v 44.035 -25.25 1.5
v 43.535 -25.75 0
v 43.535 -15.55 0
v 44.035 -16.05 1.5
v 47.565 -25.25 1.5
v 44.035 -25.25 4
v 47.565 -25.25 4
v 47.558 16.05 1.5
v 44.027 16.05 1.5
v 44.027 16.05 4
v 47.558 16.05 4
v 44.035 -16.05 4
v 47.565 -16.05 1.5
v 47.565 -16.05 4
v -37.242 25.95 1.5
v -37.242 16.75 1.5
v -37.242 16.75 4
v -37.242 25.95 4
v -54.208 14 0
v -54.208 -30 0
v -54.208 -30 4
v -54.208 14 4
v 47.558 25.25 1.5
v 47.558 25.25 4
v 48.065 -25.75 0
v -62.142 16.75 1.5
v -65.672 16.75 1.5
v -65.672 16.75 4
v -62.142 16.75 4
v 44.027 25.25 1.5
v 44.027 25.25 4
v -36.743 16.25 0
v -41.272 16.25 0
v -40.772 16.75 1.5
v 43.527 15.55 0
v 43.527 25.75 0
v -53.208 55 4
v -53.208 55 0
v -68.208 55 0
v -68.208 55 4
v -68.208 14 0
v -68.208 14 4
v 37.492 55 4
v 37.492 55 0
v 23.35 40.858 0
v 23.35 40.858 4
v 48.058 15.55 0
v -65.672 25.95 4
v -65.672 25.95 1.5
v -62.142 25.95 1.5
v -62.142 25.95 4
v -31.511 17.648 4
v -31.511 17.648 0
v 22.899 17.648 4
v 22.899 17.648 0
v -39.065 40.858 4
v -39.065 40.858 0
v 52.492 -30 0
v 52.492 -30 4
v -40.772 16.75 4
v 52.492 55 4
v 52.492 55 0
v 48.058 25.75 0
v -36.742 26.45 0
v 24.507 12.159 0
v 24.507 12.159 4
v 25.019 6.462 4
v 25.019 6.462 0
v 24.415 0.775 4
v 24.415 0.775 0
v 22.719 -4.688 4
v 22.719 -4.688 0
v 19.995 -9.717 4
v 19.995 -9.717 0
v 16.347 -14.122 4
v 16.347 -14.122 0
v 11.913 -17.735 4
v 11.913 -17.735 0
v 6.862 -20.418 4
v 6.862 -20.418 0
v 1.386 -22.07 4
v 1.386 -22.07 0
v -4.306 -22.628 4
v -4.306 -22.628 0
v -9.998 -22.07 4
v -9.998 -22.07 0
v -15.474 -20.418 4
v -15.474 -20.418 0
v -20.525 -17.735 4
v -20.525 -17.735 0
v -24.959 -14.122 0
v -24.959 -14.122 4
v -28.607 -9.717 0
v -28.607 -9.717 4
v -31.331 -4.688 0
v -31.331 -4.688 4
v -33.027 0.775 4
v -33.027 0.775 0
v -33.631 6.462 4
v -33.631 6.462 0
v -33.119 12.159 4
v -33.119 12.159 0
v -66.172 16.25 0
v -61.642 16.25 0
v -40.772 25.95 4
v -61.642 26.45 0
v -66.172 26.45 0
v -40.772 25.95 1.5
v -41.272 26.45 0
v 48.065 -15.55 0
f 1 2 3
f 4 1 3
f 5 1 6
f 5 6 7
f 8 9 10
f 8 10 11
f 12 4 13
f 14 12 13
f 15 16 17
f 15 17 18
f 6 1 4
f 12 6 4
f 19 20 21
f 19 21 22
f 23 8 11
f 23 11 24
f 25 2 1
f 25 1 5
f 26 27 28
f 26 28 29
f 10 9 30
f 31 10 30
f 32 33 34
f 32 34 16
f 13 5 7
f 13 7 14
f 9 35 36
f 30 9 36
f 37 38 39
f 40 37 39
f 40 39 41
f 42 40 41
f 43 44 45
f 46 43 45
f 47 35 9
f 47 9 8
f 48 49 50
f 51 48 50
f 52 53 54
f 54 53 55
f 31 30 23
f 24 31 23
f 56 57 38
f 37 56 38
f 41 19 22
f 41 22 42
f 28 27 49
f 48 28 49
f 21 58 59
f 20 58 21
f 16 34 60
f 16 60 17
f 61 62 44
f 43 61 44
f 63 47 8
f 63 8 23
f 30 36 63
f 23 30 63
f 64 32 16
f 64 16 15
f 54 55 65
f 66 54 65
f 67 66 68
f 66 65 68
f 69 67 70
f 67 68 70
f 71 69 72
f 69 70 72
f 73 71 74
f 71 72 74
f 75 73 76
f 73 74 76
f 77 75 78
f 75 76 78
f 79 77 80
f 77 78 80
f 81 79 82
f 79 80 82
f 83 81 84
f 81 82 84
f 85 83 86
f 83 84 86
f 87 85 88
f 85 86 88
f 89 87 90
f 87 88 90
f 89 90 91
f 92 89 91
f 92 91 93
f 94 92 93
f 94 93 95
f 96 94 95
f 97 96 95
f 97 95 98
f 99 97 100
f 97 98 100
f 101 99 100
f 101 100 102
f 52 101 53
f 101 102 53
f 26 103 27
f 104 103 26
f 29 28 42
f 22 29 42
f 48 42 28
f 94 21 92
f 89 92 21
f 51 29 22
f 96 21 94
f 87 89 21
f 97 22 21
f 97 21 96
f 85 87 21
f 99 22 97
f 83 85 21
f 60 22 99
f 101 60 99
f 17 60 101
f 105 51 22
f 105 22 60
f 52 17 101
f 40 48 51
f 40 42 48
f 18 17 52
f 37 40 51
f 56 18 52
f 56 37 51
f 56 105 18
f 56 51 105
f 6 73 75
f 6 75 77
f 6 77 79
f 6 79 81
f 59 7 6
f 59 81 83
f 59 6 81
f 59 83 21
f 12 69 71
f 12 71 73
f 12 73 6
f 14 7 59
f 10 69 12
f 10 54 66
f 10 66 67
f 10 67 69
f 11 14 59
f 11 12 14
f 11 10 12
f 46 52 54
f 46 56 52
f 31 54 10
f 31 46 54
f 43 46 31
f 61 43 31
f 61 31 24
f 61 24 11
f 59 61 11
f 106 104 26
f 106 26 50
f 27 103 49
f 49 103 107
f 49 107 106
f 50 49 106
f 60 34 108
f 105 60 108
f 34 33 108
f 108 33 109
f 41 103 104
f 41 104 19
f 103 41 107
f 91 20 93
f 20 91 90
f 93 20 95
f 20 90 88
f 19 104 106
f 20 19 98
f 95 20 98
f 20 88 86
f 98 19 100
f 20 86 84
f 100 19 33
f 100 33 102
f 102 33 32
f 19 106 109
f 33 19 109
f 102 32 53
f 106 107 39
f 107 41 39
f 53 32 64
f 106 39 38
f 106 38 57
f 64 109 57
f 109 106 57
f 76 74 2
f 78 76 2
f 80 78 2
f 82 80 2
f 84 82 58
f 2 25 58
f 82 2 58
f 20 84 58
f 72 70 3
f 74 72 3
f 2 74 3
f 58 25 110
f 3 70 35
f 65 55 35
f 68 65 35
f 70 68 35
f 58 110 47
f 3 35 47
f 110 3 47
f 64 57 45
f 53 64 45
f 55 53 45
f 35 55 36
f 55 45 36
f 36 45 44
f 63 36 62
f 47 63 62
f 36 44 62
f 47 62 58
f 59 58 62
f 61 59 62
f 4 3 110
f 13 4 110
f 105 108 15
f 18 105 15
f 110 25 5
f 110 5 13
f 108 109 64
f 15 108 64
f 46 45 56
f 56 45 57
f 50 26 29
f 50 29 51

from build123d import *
from OCP.BRepFilletAPI import BRepFilletAPI_MakeChamfer

# Parameters (mm, degrees)
SKETCH1_W           = 3.53
SKETCH1_H           = 9.2
BOSS_EXTRUDE1_DEPTH = 4
BOSS_EXTRUDE2_DEPTH = 4
CHAMFER1_SIZE       = 1.5
CHAMFER1_SIZE2      = 0.5


with BuildPart() as part:
    # Sketch1 → Boss-Extrude1 (new body)
    with BuildSketch(Plane.XY):
        Polygon((52.4925, 30), (52.4925, -30), (-54.2075, -30), (-54.2075, 14), (-68.2075, 14), (-68.2075, 30), align=None)
        with BuildLine():
            Line((-31.510630119, 17.647843267), (22.89855475, 17.647843267))
            ThreePointArc((22.89855475, 17.647843267), (-4.306037684, -22.627990687), (-31.510630119, 17.647843267))
        make_face(mode=Mode.SUBTRACT)
        with Locations((-39.0075, 21.35)):
            Rectangle(SKETCH1_W, SKETCH1_H, mode=Mode.SUBTRACT)
        with Locations((45.7925, 20.65)):
            Rectangle(SKETCH1_W, SKETCH1_H, mode=Mode.SUBTRACT)
        with Locations((45.8, -20.65)):
            Rectangle(SKETCH1_W, SKETCH1_H, mode=Mode.SUBTRACT)
        with Locations((-63.9075, 21.35)):
            Rectangle(SKETCH1_W, SKETCH1_H, mode=Mode.SUBTRACT)
    extrude(amount=BOSS_EXTRUDE1_DEPTH)

    # Sketch2 → Boss-Extrude2 (add)
    with BuildSketch(Plane.XY):
        Polygon((-68.2075, 30), (52.4925, 30), (52.4925, 55), (37.4925, 55), (23.350364376, 40.857864376), (-39.065364376, 40.857864376), (-53.2075, 55), (-68.2075, 55), align=None)
    extrude(amount=BOSS_EXTRUDE2_DEPTH)

    # Chamfer1: one chamfer whose edges measure the first distance from different faces: ONE call of the kernel's chamfer builder (chamfer() names one face for all edges)
    chamfer1_edges_1 = [part.edges().sort_by_distance(p)[0] for p in [
        (-40.7725, 21.35, 0),
    ]]
    chamfer1_side_1 = [part.faces().sort_by_distance(p)[0] for p in [
        (-40.7725, 21.35, 2),
    ]]
    chamfer1_edges_2 = [part.edges().sort_by_distance(p)[0] for p in [
        (-39.0075, 16.75, 0),
    ]]
    chamfer1_side_2 = [part.faces().sort_by_distance(p)[0] for p in [
        (-39.0075, 16.75, 2),
    ]]
    chamfer1_edges_3 = [part.edges().sort_by_distance(p)[0] for p in [
        (-37.2425, 21.35, 0),
    ]]
    chamfer1_side_3 = [part.faces().sort_by_distance(p)[0] for p in [
        (-37.2425, 21.35, 2),
    ]]
    chamfer1_edges_4 = [part.edges().sort_by_distance(p)[0] for p in [
        (-39.0075, 25.95, 0),
    ]]
    chamfer1_side_4 = [part.faces().sort_by_distance(p)[0] for p in [
        (-39.0075, 25.95, 2),
    ]]
    chamfer1_edges_5 = [part.edges().sort_by_distance(p)[0] for p in [
        (-65.6725, 21.35, 0),
    ]]
    chamfer1_side_5 = [part.faces().sort_by_distance(p)[0] for p in [
        (-65.6725, 21.35, 2),
    ]]
    chamfer1_edges_6 = [part.edges().sort_by_distance(p)[0] for p in [
        (-63.9075, 16.75, 0),
    ]]
    chamfer1_side_6 = [part.faces().sort_by_distance(p)[0] for p in [
        (-63.9075, 16.75, 2),
    ]]
    chamfer1_edges_7 = [part.edges().sort_by_distance(p)[0] for p in [
        (-62.1425, 21.35, 0),
    ]]
    chamfer1_side_7 = [part.faces().sort_by_distance(p)[0] for p in [
        (-62.1425, 21.35, 2),
    ]]
    chamfer1_edges_8 = [part.edges().sort_by_distance(p)[0] for p in [
        (-63.9075, 25.95, 0),
    ]]
    chamfer1_side_8 = [part.faces().sort_by_distance(p)[0] for p in [
        (-63.9075, 25.95, 2),
    ]]
    chamfer1_edges_9 = [part.edges().sort_by_distance(p)[0] for p in [
        (44.0275, 20.65, 0),
    ]]
    chamfer1_side_9 = [part.faces().sort_by_distance(p)[0] for p in [
        (44.0275, 20.65, 2),
    ]]
    chamfer1_edges_10 = [part.edges().sort_by_distance(p)[0] for p in [
        (45.7925, 16.05, 0),
    ]]
    chamfer1_side_10 = [part.faces().sort_by_distance(p)[0] for p in [
        (45.7925, 16.05, 2),
    ]]
    chamfer1_edges_11 = [part.edges().sort_by_distance(p)[0] for p in [
        (47.5575, 20.65, 0),
    ]]
    chamfer1_side_11 = [part.faces().sort_by_distance(p)[0] for p in [
        (47.5575, 20.65, 2),
    ]]
    chamfer1_edges_12 = [part.edges().sort_by_distance(p)[0] for p in [
        (45.7925, 25.25, 0),
    ]]
    chamfer1_side_12 = [part.faces().sort_by_distance(p)[0] for p in [
        (45.7925, 25.25, 2),
    ]]
    chamfer1_edges_13 = [part.edges().sort_by_distance(p)[0] for p in [
        (47.565, -20.65, 0),
    ]]
    chamfer1_side_13 = [part.faces().sort_by_distance(p)[0] for p in [
        (47.565, -20.65, 2),
    ]]
    chamfer1_edges_14 = [part.edges().sort_by_distance(p)[0] for p in [
        (45.8, -16.05, 0),
    ]]
    chamfer1_side_14 = [part.faces().sort_by_distance(p)[0] for p in [
        (45.8, -16.05, 2),
    ]]
    chamfer1_edges_15 = [part.edges().sort_by_distance(p)[0] for p in [
        (44.035, -20.65, 0),
    ]]
    chamfer1_side_15 = [part.faces().sort_by_distance(p)[0] for p in [
        (44.035, -20.65, 2),
    ]]
    chamfer1_edges_16 = [part.edges().sort_by_distance(p)[0] for p in [
        (45.8, -25.25, 0),
    ]]
    chamfer1_side_16 = [part.faces().sort_by_distance(p)[0] for p in [
        (45.8, -25.25, 2),
    ]]
    chamfer1 = BRepFilletAPI_MakeChamfer(part.part.solid().wrapped)
    for e in chamfer1_edges_1:
        chamfer1.Add(CHAMFER1_SIZE, CHAMFER1_SIZE2, e.wrapped, chamfer1_side_1[0].wrapped)  # the first distance lies on this face
    for e in chamfer1_edges_2:
        chamfer1.Add(CHAMFER1_SIZE, CHAMFER1_SIZE2, e.wrapped, chamfer1_side_2[0].wrapped)  # the first distance lies on this face
    for e in chamfer1_edges_3:
        chamfer1.Add(CHAMFER1_SIZE, CHAMFER1_SIZE2, e.wrapped, chamfer1_side_3[0].wrapped)  # the first distance lies on this face
    for e in chamfer1_edges_4:
        chamfer1.Add(CHAMFER1_SIZE, CHAMFER1_SIZE2, e.wrapped, chamfer1_side_4[0].wrapped)  # the first distance lies on this face
    for e in chamfer1_edges_5:
        chamfer1.Add(CHAMFER1_SIZE, CHAMFER1_SIZE2, e.wrapped, chamfer1_side_5[0].wrapped)  # the first distance lies on this face
    for e in chamfer1_edges_6:
        chamfer1.Add(CHAMFER1_SIZE, CHAMFER1_SIZE2, e.wrapped, chamfer1_side_6[0].wrapped)  # the first distance lies on this face
    for e in chamfer1_edges_7:
        chamfer1.Add(CHAMFER1_SIZE, CHAMFER1_SIZE2, e.wrapped, chamfer1_side_7[0].wrapped)  # the first distance lies on this face
    for e in chamfer1_edges_8:
        chamfer1.Add(CHAMFER1_SIZE, CHAMFER1_SIZE2, e.wrapped, chamfer1_side_8[0].wrapped)  # the first distance lies on this face
    for e in chamfer1_edges_9:
        chamfer1.Add(CHAMFER1_SIZE, CHAMFER1_SIZE2, e.wrapped, chamfer1_side_9[0].wrapped)  # the first distance lies on this face
    for e in chamfer1_edges_10:
        chamfer1.Add(CHAMFER1_SIZE, CHAMFER1_SIZE2, e.wrapped, chamfer1_side_10[0].wrapped)  # the first distance lies on this face
    for e in chamfer1_edges_11:
        chamfer1.Add(CHAMFER1_SIZE, CHAMFER1_SIZE2, e.wrapped, chamfer1_side_11[0].wrapped)  # the first distance lies on this face
    for e in chamfer1_edges_12:
        chamfer1.Add(CHAMFER1_SIZE, CHAMFER1_SIZE2, e.wrapped, chamfer1_side_12[0].wrapped)  # the first distance lies on this face
    for e in chamfer1_edges_13:
        chamfer1.Add(CHAMFER1_SIZE, CHAMFER1_SIZE2, e.wrapped, chamfer1_side_13[0].wrapped)  # the first distance lies on this face
    for e in chamfer1_edges_14:
        chamfer1.Add(CHAMFER1_SIZE, CHAMFER1_SIZE2, e.wrapped, chamfer1_side_14[0].wrapped)  # the first distance lies on this face
    for e in chamfer1_edges_15:
        chamfer1.Add(CHAMFER1_SIZE, CHAMFER1_SIZE2, e.wrapped, chamfer1_side_15[0].wrapped)  # the first distance lies on this face
    for e in chamfer1_edges_16:
        chamfer1.Add(CHAMFER1_SIZE, CHAMFER1_SIZE2, e.wrapped, chamfer1_side_16[0].wrapped)  # the first distance lies on this face
    add(Compound.cast(chamfer1.Shape()), mode=Mode.REPLACE)


solid = part.part
